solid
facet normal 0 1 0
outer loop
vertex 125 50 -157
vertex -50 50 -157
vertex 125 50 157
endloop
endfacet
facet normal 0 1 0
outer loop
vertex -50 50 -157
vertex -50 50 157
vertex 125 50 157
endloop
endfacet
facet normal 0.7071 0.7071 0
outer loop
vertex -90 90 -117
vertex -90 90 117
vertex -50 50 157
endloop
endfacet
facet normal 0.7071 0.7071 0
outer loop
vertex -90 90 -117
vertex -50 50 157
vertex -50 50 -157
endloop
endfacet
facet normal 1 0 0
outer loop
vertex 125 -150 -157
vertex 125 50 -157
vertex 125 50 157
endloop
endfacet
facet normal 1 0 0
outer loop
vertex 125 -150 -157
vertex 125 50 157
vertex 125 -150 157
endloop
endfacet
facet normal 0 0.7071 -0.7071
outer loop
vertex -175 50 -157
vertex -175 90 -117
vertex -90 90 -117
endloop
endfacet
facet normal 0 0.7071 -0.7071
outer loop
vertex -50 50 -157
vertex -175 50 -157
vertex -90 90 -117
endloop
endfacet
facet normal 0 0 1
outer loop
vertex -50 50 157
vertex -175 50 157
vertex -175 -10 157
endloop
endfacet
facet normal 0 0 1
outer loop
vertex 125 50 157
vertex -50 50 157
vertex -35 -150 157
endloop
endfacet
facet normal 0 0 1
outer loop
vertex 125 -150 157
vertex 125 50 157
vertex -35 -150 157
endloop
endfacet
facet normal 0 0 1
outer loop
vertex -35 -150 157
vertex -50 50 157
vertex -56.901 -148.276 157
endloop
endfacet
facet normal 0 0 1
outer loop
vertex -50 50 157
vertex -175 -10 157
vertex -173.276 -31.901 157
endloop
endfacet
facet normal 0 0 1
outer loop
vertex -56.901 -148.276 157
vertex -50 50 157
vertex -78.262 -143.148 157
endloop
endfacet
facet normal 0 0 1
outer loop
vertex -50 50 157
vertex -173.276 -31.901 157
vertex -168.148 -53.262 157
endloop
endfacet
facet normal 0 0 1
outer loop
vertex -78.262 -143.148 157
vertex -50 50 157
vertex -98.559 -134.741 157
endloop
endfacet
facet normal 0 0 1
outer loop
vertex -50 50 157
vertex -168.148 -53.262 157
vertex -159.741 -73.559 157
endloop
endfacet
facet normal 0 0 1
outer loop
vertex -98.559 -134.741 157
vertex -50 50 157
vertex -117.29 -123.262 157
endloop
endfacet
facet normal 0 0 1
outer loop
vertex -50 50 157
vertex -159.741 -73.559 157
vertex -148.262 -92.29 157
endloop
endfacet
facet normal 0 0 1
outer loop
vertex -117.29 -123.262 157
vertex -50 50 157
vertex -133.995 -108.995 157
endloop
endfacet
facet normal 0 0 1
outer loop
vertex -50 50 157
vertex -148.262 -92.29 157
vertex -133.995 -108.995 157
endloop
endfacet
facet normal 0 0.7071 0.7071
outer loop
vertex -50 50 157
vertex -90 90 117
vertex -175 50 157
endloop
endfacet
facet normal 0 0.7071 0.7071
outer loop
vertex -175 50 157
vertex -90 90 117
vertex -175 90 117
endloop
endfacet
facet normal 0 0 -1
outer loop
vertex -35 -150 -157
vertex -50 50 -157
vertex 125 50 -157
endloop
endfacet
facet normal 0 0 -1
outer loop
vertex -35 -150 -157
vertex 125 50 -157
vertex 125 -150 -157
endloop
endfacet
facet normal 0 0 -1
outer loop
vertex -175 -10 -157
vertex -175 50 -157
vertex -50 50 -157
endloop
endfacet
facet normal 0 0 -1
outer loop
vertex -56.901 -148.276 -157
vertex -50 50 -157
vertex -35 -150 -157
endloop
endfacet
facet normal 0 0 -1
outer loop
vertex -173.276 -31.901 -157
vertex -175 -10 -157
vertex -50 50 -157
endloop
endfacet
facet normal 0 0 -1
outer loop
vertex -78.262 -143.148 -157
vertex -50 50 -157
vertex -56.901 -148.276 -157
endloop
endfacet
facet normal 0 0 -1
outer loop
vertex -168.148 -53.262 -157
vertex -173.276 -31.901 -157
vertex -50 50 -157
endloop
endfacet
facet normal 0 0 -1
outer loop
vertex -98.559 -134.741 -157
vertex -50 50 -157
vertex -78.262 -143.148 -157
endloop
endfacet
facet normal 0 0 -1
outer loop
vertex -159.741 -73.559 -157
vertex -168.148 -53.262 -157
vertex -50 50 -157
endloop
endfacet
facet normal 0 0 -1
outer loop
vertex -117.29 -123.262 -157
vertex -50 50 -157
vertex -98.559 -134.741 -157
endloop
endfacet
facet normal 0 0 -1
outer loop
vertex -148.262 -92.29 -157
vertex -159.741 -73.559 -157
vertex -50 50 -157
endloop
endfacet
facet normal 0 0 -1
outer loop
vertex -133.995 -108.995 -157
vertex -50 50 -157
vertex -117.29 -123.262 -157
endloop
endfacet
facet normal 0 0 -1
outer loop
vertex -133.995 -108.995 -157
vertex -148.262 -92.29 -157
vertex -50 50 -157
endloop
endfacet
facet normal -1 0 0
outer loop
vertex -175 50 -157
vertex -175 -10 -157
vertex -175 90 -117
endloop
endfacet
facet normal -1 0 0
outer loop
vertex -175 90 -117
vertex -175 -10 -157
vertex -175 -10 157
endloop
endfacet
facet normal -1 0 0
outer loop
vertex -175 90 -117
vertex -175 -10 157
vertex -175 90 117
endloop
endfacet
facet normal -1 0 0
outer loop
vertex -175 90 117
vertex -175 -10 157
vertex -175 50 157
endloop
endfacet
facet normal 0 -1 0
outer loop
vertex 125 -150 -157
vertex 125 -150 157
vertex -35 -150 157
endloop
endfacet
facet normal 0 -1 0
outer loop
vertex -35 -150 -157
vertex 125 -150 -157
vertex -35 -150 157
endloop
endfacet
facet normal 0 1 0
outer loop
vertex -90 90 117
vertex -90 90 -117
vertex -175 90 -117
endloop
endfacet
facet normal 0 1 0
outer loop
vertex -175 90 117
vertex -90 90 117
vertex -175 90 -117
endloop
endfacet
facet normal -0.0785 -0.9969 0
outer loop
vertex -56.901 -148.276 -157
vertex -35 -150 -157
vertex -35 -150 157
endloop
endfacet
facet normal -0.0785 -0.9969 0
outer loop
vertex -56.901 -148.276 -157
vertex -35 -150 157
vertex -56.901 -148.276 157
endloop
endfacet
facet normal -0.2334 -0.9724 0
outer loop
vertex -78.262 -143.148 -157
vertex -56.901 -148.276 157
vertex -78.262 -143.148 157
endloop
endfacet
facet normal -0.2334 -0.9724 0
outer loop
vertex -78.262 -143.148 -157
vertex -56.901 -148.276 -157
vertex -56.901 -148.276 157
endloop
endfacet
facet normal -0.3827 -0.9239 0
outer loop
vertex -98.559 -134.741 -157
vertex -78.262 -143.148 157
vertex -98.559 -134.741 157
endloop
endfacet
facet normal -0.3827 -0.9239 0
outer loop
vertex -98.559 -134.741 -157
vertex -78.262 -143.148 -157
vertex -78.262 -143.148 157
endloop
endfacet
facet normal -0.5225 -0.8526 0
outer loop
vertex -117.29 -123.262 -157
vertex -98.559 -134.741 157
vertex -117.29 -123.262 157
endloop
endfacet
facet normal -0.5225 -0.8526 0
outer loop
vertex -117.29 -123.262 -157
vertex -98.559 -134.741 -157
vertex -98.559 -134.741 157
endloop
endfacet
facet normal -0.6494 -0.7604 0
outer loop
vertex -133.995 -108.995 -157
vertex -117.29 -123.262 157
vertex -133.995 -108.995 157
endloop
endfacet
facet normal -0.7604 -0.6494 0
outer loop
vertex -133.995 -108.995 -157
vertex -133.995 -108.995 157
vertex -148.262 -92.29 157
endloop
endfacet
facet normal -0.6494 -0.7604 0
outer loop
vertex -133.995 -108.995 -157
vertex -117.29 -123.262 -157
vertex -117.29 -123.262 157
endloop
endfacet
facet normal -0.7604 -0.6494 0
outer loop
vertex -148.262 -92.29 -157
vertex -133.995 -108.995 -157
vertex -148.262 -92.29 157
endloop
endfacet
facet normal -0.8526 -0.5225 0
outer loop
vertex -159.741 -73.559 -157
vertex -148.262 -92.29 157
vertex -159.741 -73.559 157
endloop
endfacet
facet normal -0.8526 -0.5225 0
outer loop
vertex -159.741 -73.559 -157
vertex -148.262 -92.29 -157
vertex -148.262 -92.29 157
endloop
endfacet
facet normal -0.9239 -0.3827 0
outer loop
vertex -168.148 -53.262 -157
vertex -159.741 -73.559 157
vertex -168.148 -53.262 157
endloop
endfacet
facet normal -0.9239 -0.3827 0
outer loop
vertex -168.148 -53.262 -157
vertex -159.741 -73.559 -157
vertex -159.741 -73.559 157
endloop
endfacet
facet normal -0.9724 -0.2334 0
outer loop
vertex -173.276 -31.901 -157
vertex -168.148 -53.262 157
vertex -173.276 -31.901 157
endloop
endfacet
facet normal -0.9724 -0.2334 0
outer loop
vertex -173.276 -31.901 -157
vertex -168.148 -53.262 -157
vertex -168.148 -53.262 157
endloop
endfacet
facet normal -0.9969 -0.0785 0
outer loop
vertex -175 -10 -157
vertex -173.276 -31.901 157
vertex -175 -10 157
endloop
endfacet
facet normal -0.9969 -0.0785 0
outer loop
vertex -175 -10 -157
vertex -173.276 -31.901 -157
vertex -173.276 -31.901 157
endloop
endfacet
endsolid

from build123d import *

# Parameters (mm, degrees)
BOSS_EXTRUDE1_DEPTH      = 117
BOSS_EXTRUDE1_DEPTH_BACK = 117
SKETCH1_W                = 350
SKETCH1_H                = 300
BOSS_EXTRUDE2_DEPTH      = 200
BOSS_EXTRUDE2_DEPTH_BACK = 200
CUT_EXTRUDE1_DEPTH       = 540
CUT_EXTRUDE2_DEPTH       = 138
CUT_EXTRUDE2_DEPTH_BACK  = 540
CHAMFER1_SIZE            = 40
CHAMFER2_SIZE            = 40
FILLET1_R                = 140
CUT_EXTRUDE3_DEPTH       = 602.0000000000001
CUT_EXTRUDE4_DEPTH       = 602.0000000000001


with BuildPart() as part:
    # Sketch1 → Boss-Extrude1 (new, two sides: drawn at the far end of the back side and taken through both)
    with BuildSketch(Plane.XY.offset(-BOSS_EXTRUDE1_DEPTH_BACK)):
        Rectangle(SKETCH1_W, SKETCH1_H)
    extrude(amount=BOSS_EXTRUDE1_DEPTH + BOSS_EXTRUDE1_DEPTH_BACK)

    # Sketch3 → Boss-Extrude2 (add, two sides: drawn at the far end of the back side and taken through both)
    with BuildSketch(Plane(origin=(0, 0, 0), x_dir=(-1, 0, 0), z_dir=(0, 0, -1)).offset(-BOSS_EXTRUDE2_DEPTH_BACK)):
        Polygon((-175, 150), (-175, -150), (175, -150), (174.99999999999997, 50.00000000000006), (-75.00000000000003, 50.000000000000014), (-75.00000000000004, 150), align=None)
    extrude(amount=BOSS_EXTRUDE2_DEPTH + BOSS_EXTRUDE2_DEPTH_BACK)

    # Sketch4 → Cut-Extrude1 (cut)
    with BuildSketch(Plane(origin=(0, 0, -117), x_dir=(-1, 0, 0), z_dir=(0, 0, -1))):
        Polygon((174.99999999999997, 150), (-75.00000000000004, 149.99999999999997), (-75.00000000000004, 89.99999999999997), (174.99999999999997, 90), align=None)
    extrude(amount=-CUT_EXTRUDE1_DEPTH, mode=Mode.SUBTRACT)

    # Sketch6 → Cut-Extrude2 (cut, two sides: drawn at the far end of the back side and taken through both)
    with BuildSketch(Plane(origin=(0, 0, -117), x_dir=(-1, 0, 0), z_dir=(0, 0, -1)).offset(-CUT_EXTRUDE2_DEPTH_BACK)):
        Polygon((-188.8193544446854, 158.10037053286104), (89.99999999999997, 158.10037053286104), (89.99999999999997, 50.00000000000004), (-188.8193544446854, 50.00000000000003), align=None)
    extrude(amount=CUT_EXTRUDE2_DEPTH + CUT_EXTRUDE2_DEPTH_BACK, mode=Mode.SUBTRACT)

    # Chamfer1
    chamfer1_edges = [part.edges().sort_by_distance(p)[0] for p in [
        (-89.99999999999997, 50.00000000000004, 0),
    ]]
    chamfer(chamfer1_edges, length=CHAMFER1_SIZE - 0.0001)  # a hair under: the kernel refuses the full size

    # Chamfer2
    chamfer2_edges = [part.edges().sort_by_distance(p)[0] for p in [
        (-112.50004999999997, 50.00000000000004, 117),
        (-112.50004999999997, 50.00000000000004, -117),
    ]]
    chamfer(chamfer2_edges, length=CHAMFER2_SIZE - 0.0001)  # a hair under: the kernel refuses the full size

    # Fillet1
    fillet1_edges = [part.edges().sort_by_distance(p)[0] for p in [
        (-175, -150, 0),
    ]]
    fillet(fillet1_edges, radius=FILLET1_R)

    # Sketch7 → Cut-Extrude3 (cut)
    with BuildSketch(Plane(origin=(0, 0, -200), x_dir=(-1, 0, 0), z_dir=(0, 0, -1))):
        Polygon((-124.99999999999997, 50.00000000000004), (-124.99999999999996, -150), (-196.63418814024195, -174.37612145790905), (-210.87565010922705, 102.36305485317497), align=None)
    extrude(amount=-CUT_EXTRUDE3_DEPTH, mode=Mode.SUBTRACT)

    # Sketch8 → Cut-Extrude4 (cut)
    with BuildSketch(Plane.ZY.offset(174.99999999999997)):
        Polygon((156.99999999999991, 50.00000000000004), (156.99999999999991, -180.65334412999255), (404.27559038441177, -197.1355795745069), (273.0172818180443, 154.636687383358), align=None)
        Polygon((-157.00000000000037, 50.00000000000004), (-157.00000000000037, -188.89446185224972), (-332.7435139552091, -205.02559262419945), (-278.28880023445754, 167.10797834540983), align=None)
    extrude(amount=-CUT_EXTRUDE4_DEPTH, mode=Mode.SUBTRACT)


solid = part.part
